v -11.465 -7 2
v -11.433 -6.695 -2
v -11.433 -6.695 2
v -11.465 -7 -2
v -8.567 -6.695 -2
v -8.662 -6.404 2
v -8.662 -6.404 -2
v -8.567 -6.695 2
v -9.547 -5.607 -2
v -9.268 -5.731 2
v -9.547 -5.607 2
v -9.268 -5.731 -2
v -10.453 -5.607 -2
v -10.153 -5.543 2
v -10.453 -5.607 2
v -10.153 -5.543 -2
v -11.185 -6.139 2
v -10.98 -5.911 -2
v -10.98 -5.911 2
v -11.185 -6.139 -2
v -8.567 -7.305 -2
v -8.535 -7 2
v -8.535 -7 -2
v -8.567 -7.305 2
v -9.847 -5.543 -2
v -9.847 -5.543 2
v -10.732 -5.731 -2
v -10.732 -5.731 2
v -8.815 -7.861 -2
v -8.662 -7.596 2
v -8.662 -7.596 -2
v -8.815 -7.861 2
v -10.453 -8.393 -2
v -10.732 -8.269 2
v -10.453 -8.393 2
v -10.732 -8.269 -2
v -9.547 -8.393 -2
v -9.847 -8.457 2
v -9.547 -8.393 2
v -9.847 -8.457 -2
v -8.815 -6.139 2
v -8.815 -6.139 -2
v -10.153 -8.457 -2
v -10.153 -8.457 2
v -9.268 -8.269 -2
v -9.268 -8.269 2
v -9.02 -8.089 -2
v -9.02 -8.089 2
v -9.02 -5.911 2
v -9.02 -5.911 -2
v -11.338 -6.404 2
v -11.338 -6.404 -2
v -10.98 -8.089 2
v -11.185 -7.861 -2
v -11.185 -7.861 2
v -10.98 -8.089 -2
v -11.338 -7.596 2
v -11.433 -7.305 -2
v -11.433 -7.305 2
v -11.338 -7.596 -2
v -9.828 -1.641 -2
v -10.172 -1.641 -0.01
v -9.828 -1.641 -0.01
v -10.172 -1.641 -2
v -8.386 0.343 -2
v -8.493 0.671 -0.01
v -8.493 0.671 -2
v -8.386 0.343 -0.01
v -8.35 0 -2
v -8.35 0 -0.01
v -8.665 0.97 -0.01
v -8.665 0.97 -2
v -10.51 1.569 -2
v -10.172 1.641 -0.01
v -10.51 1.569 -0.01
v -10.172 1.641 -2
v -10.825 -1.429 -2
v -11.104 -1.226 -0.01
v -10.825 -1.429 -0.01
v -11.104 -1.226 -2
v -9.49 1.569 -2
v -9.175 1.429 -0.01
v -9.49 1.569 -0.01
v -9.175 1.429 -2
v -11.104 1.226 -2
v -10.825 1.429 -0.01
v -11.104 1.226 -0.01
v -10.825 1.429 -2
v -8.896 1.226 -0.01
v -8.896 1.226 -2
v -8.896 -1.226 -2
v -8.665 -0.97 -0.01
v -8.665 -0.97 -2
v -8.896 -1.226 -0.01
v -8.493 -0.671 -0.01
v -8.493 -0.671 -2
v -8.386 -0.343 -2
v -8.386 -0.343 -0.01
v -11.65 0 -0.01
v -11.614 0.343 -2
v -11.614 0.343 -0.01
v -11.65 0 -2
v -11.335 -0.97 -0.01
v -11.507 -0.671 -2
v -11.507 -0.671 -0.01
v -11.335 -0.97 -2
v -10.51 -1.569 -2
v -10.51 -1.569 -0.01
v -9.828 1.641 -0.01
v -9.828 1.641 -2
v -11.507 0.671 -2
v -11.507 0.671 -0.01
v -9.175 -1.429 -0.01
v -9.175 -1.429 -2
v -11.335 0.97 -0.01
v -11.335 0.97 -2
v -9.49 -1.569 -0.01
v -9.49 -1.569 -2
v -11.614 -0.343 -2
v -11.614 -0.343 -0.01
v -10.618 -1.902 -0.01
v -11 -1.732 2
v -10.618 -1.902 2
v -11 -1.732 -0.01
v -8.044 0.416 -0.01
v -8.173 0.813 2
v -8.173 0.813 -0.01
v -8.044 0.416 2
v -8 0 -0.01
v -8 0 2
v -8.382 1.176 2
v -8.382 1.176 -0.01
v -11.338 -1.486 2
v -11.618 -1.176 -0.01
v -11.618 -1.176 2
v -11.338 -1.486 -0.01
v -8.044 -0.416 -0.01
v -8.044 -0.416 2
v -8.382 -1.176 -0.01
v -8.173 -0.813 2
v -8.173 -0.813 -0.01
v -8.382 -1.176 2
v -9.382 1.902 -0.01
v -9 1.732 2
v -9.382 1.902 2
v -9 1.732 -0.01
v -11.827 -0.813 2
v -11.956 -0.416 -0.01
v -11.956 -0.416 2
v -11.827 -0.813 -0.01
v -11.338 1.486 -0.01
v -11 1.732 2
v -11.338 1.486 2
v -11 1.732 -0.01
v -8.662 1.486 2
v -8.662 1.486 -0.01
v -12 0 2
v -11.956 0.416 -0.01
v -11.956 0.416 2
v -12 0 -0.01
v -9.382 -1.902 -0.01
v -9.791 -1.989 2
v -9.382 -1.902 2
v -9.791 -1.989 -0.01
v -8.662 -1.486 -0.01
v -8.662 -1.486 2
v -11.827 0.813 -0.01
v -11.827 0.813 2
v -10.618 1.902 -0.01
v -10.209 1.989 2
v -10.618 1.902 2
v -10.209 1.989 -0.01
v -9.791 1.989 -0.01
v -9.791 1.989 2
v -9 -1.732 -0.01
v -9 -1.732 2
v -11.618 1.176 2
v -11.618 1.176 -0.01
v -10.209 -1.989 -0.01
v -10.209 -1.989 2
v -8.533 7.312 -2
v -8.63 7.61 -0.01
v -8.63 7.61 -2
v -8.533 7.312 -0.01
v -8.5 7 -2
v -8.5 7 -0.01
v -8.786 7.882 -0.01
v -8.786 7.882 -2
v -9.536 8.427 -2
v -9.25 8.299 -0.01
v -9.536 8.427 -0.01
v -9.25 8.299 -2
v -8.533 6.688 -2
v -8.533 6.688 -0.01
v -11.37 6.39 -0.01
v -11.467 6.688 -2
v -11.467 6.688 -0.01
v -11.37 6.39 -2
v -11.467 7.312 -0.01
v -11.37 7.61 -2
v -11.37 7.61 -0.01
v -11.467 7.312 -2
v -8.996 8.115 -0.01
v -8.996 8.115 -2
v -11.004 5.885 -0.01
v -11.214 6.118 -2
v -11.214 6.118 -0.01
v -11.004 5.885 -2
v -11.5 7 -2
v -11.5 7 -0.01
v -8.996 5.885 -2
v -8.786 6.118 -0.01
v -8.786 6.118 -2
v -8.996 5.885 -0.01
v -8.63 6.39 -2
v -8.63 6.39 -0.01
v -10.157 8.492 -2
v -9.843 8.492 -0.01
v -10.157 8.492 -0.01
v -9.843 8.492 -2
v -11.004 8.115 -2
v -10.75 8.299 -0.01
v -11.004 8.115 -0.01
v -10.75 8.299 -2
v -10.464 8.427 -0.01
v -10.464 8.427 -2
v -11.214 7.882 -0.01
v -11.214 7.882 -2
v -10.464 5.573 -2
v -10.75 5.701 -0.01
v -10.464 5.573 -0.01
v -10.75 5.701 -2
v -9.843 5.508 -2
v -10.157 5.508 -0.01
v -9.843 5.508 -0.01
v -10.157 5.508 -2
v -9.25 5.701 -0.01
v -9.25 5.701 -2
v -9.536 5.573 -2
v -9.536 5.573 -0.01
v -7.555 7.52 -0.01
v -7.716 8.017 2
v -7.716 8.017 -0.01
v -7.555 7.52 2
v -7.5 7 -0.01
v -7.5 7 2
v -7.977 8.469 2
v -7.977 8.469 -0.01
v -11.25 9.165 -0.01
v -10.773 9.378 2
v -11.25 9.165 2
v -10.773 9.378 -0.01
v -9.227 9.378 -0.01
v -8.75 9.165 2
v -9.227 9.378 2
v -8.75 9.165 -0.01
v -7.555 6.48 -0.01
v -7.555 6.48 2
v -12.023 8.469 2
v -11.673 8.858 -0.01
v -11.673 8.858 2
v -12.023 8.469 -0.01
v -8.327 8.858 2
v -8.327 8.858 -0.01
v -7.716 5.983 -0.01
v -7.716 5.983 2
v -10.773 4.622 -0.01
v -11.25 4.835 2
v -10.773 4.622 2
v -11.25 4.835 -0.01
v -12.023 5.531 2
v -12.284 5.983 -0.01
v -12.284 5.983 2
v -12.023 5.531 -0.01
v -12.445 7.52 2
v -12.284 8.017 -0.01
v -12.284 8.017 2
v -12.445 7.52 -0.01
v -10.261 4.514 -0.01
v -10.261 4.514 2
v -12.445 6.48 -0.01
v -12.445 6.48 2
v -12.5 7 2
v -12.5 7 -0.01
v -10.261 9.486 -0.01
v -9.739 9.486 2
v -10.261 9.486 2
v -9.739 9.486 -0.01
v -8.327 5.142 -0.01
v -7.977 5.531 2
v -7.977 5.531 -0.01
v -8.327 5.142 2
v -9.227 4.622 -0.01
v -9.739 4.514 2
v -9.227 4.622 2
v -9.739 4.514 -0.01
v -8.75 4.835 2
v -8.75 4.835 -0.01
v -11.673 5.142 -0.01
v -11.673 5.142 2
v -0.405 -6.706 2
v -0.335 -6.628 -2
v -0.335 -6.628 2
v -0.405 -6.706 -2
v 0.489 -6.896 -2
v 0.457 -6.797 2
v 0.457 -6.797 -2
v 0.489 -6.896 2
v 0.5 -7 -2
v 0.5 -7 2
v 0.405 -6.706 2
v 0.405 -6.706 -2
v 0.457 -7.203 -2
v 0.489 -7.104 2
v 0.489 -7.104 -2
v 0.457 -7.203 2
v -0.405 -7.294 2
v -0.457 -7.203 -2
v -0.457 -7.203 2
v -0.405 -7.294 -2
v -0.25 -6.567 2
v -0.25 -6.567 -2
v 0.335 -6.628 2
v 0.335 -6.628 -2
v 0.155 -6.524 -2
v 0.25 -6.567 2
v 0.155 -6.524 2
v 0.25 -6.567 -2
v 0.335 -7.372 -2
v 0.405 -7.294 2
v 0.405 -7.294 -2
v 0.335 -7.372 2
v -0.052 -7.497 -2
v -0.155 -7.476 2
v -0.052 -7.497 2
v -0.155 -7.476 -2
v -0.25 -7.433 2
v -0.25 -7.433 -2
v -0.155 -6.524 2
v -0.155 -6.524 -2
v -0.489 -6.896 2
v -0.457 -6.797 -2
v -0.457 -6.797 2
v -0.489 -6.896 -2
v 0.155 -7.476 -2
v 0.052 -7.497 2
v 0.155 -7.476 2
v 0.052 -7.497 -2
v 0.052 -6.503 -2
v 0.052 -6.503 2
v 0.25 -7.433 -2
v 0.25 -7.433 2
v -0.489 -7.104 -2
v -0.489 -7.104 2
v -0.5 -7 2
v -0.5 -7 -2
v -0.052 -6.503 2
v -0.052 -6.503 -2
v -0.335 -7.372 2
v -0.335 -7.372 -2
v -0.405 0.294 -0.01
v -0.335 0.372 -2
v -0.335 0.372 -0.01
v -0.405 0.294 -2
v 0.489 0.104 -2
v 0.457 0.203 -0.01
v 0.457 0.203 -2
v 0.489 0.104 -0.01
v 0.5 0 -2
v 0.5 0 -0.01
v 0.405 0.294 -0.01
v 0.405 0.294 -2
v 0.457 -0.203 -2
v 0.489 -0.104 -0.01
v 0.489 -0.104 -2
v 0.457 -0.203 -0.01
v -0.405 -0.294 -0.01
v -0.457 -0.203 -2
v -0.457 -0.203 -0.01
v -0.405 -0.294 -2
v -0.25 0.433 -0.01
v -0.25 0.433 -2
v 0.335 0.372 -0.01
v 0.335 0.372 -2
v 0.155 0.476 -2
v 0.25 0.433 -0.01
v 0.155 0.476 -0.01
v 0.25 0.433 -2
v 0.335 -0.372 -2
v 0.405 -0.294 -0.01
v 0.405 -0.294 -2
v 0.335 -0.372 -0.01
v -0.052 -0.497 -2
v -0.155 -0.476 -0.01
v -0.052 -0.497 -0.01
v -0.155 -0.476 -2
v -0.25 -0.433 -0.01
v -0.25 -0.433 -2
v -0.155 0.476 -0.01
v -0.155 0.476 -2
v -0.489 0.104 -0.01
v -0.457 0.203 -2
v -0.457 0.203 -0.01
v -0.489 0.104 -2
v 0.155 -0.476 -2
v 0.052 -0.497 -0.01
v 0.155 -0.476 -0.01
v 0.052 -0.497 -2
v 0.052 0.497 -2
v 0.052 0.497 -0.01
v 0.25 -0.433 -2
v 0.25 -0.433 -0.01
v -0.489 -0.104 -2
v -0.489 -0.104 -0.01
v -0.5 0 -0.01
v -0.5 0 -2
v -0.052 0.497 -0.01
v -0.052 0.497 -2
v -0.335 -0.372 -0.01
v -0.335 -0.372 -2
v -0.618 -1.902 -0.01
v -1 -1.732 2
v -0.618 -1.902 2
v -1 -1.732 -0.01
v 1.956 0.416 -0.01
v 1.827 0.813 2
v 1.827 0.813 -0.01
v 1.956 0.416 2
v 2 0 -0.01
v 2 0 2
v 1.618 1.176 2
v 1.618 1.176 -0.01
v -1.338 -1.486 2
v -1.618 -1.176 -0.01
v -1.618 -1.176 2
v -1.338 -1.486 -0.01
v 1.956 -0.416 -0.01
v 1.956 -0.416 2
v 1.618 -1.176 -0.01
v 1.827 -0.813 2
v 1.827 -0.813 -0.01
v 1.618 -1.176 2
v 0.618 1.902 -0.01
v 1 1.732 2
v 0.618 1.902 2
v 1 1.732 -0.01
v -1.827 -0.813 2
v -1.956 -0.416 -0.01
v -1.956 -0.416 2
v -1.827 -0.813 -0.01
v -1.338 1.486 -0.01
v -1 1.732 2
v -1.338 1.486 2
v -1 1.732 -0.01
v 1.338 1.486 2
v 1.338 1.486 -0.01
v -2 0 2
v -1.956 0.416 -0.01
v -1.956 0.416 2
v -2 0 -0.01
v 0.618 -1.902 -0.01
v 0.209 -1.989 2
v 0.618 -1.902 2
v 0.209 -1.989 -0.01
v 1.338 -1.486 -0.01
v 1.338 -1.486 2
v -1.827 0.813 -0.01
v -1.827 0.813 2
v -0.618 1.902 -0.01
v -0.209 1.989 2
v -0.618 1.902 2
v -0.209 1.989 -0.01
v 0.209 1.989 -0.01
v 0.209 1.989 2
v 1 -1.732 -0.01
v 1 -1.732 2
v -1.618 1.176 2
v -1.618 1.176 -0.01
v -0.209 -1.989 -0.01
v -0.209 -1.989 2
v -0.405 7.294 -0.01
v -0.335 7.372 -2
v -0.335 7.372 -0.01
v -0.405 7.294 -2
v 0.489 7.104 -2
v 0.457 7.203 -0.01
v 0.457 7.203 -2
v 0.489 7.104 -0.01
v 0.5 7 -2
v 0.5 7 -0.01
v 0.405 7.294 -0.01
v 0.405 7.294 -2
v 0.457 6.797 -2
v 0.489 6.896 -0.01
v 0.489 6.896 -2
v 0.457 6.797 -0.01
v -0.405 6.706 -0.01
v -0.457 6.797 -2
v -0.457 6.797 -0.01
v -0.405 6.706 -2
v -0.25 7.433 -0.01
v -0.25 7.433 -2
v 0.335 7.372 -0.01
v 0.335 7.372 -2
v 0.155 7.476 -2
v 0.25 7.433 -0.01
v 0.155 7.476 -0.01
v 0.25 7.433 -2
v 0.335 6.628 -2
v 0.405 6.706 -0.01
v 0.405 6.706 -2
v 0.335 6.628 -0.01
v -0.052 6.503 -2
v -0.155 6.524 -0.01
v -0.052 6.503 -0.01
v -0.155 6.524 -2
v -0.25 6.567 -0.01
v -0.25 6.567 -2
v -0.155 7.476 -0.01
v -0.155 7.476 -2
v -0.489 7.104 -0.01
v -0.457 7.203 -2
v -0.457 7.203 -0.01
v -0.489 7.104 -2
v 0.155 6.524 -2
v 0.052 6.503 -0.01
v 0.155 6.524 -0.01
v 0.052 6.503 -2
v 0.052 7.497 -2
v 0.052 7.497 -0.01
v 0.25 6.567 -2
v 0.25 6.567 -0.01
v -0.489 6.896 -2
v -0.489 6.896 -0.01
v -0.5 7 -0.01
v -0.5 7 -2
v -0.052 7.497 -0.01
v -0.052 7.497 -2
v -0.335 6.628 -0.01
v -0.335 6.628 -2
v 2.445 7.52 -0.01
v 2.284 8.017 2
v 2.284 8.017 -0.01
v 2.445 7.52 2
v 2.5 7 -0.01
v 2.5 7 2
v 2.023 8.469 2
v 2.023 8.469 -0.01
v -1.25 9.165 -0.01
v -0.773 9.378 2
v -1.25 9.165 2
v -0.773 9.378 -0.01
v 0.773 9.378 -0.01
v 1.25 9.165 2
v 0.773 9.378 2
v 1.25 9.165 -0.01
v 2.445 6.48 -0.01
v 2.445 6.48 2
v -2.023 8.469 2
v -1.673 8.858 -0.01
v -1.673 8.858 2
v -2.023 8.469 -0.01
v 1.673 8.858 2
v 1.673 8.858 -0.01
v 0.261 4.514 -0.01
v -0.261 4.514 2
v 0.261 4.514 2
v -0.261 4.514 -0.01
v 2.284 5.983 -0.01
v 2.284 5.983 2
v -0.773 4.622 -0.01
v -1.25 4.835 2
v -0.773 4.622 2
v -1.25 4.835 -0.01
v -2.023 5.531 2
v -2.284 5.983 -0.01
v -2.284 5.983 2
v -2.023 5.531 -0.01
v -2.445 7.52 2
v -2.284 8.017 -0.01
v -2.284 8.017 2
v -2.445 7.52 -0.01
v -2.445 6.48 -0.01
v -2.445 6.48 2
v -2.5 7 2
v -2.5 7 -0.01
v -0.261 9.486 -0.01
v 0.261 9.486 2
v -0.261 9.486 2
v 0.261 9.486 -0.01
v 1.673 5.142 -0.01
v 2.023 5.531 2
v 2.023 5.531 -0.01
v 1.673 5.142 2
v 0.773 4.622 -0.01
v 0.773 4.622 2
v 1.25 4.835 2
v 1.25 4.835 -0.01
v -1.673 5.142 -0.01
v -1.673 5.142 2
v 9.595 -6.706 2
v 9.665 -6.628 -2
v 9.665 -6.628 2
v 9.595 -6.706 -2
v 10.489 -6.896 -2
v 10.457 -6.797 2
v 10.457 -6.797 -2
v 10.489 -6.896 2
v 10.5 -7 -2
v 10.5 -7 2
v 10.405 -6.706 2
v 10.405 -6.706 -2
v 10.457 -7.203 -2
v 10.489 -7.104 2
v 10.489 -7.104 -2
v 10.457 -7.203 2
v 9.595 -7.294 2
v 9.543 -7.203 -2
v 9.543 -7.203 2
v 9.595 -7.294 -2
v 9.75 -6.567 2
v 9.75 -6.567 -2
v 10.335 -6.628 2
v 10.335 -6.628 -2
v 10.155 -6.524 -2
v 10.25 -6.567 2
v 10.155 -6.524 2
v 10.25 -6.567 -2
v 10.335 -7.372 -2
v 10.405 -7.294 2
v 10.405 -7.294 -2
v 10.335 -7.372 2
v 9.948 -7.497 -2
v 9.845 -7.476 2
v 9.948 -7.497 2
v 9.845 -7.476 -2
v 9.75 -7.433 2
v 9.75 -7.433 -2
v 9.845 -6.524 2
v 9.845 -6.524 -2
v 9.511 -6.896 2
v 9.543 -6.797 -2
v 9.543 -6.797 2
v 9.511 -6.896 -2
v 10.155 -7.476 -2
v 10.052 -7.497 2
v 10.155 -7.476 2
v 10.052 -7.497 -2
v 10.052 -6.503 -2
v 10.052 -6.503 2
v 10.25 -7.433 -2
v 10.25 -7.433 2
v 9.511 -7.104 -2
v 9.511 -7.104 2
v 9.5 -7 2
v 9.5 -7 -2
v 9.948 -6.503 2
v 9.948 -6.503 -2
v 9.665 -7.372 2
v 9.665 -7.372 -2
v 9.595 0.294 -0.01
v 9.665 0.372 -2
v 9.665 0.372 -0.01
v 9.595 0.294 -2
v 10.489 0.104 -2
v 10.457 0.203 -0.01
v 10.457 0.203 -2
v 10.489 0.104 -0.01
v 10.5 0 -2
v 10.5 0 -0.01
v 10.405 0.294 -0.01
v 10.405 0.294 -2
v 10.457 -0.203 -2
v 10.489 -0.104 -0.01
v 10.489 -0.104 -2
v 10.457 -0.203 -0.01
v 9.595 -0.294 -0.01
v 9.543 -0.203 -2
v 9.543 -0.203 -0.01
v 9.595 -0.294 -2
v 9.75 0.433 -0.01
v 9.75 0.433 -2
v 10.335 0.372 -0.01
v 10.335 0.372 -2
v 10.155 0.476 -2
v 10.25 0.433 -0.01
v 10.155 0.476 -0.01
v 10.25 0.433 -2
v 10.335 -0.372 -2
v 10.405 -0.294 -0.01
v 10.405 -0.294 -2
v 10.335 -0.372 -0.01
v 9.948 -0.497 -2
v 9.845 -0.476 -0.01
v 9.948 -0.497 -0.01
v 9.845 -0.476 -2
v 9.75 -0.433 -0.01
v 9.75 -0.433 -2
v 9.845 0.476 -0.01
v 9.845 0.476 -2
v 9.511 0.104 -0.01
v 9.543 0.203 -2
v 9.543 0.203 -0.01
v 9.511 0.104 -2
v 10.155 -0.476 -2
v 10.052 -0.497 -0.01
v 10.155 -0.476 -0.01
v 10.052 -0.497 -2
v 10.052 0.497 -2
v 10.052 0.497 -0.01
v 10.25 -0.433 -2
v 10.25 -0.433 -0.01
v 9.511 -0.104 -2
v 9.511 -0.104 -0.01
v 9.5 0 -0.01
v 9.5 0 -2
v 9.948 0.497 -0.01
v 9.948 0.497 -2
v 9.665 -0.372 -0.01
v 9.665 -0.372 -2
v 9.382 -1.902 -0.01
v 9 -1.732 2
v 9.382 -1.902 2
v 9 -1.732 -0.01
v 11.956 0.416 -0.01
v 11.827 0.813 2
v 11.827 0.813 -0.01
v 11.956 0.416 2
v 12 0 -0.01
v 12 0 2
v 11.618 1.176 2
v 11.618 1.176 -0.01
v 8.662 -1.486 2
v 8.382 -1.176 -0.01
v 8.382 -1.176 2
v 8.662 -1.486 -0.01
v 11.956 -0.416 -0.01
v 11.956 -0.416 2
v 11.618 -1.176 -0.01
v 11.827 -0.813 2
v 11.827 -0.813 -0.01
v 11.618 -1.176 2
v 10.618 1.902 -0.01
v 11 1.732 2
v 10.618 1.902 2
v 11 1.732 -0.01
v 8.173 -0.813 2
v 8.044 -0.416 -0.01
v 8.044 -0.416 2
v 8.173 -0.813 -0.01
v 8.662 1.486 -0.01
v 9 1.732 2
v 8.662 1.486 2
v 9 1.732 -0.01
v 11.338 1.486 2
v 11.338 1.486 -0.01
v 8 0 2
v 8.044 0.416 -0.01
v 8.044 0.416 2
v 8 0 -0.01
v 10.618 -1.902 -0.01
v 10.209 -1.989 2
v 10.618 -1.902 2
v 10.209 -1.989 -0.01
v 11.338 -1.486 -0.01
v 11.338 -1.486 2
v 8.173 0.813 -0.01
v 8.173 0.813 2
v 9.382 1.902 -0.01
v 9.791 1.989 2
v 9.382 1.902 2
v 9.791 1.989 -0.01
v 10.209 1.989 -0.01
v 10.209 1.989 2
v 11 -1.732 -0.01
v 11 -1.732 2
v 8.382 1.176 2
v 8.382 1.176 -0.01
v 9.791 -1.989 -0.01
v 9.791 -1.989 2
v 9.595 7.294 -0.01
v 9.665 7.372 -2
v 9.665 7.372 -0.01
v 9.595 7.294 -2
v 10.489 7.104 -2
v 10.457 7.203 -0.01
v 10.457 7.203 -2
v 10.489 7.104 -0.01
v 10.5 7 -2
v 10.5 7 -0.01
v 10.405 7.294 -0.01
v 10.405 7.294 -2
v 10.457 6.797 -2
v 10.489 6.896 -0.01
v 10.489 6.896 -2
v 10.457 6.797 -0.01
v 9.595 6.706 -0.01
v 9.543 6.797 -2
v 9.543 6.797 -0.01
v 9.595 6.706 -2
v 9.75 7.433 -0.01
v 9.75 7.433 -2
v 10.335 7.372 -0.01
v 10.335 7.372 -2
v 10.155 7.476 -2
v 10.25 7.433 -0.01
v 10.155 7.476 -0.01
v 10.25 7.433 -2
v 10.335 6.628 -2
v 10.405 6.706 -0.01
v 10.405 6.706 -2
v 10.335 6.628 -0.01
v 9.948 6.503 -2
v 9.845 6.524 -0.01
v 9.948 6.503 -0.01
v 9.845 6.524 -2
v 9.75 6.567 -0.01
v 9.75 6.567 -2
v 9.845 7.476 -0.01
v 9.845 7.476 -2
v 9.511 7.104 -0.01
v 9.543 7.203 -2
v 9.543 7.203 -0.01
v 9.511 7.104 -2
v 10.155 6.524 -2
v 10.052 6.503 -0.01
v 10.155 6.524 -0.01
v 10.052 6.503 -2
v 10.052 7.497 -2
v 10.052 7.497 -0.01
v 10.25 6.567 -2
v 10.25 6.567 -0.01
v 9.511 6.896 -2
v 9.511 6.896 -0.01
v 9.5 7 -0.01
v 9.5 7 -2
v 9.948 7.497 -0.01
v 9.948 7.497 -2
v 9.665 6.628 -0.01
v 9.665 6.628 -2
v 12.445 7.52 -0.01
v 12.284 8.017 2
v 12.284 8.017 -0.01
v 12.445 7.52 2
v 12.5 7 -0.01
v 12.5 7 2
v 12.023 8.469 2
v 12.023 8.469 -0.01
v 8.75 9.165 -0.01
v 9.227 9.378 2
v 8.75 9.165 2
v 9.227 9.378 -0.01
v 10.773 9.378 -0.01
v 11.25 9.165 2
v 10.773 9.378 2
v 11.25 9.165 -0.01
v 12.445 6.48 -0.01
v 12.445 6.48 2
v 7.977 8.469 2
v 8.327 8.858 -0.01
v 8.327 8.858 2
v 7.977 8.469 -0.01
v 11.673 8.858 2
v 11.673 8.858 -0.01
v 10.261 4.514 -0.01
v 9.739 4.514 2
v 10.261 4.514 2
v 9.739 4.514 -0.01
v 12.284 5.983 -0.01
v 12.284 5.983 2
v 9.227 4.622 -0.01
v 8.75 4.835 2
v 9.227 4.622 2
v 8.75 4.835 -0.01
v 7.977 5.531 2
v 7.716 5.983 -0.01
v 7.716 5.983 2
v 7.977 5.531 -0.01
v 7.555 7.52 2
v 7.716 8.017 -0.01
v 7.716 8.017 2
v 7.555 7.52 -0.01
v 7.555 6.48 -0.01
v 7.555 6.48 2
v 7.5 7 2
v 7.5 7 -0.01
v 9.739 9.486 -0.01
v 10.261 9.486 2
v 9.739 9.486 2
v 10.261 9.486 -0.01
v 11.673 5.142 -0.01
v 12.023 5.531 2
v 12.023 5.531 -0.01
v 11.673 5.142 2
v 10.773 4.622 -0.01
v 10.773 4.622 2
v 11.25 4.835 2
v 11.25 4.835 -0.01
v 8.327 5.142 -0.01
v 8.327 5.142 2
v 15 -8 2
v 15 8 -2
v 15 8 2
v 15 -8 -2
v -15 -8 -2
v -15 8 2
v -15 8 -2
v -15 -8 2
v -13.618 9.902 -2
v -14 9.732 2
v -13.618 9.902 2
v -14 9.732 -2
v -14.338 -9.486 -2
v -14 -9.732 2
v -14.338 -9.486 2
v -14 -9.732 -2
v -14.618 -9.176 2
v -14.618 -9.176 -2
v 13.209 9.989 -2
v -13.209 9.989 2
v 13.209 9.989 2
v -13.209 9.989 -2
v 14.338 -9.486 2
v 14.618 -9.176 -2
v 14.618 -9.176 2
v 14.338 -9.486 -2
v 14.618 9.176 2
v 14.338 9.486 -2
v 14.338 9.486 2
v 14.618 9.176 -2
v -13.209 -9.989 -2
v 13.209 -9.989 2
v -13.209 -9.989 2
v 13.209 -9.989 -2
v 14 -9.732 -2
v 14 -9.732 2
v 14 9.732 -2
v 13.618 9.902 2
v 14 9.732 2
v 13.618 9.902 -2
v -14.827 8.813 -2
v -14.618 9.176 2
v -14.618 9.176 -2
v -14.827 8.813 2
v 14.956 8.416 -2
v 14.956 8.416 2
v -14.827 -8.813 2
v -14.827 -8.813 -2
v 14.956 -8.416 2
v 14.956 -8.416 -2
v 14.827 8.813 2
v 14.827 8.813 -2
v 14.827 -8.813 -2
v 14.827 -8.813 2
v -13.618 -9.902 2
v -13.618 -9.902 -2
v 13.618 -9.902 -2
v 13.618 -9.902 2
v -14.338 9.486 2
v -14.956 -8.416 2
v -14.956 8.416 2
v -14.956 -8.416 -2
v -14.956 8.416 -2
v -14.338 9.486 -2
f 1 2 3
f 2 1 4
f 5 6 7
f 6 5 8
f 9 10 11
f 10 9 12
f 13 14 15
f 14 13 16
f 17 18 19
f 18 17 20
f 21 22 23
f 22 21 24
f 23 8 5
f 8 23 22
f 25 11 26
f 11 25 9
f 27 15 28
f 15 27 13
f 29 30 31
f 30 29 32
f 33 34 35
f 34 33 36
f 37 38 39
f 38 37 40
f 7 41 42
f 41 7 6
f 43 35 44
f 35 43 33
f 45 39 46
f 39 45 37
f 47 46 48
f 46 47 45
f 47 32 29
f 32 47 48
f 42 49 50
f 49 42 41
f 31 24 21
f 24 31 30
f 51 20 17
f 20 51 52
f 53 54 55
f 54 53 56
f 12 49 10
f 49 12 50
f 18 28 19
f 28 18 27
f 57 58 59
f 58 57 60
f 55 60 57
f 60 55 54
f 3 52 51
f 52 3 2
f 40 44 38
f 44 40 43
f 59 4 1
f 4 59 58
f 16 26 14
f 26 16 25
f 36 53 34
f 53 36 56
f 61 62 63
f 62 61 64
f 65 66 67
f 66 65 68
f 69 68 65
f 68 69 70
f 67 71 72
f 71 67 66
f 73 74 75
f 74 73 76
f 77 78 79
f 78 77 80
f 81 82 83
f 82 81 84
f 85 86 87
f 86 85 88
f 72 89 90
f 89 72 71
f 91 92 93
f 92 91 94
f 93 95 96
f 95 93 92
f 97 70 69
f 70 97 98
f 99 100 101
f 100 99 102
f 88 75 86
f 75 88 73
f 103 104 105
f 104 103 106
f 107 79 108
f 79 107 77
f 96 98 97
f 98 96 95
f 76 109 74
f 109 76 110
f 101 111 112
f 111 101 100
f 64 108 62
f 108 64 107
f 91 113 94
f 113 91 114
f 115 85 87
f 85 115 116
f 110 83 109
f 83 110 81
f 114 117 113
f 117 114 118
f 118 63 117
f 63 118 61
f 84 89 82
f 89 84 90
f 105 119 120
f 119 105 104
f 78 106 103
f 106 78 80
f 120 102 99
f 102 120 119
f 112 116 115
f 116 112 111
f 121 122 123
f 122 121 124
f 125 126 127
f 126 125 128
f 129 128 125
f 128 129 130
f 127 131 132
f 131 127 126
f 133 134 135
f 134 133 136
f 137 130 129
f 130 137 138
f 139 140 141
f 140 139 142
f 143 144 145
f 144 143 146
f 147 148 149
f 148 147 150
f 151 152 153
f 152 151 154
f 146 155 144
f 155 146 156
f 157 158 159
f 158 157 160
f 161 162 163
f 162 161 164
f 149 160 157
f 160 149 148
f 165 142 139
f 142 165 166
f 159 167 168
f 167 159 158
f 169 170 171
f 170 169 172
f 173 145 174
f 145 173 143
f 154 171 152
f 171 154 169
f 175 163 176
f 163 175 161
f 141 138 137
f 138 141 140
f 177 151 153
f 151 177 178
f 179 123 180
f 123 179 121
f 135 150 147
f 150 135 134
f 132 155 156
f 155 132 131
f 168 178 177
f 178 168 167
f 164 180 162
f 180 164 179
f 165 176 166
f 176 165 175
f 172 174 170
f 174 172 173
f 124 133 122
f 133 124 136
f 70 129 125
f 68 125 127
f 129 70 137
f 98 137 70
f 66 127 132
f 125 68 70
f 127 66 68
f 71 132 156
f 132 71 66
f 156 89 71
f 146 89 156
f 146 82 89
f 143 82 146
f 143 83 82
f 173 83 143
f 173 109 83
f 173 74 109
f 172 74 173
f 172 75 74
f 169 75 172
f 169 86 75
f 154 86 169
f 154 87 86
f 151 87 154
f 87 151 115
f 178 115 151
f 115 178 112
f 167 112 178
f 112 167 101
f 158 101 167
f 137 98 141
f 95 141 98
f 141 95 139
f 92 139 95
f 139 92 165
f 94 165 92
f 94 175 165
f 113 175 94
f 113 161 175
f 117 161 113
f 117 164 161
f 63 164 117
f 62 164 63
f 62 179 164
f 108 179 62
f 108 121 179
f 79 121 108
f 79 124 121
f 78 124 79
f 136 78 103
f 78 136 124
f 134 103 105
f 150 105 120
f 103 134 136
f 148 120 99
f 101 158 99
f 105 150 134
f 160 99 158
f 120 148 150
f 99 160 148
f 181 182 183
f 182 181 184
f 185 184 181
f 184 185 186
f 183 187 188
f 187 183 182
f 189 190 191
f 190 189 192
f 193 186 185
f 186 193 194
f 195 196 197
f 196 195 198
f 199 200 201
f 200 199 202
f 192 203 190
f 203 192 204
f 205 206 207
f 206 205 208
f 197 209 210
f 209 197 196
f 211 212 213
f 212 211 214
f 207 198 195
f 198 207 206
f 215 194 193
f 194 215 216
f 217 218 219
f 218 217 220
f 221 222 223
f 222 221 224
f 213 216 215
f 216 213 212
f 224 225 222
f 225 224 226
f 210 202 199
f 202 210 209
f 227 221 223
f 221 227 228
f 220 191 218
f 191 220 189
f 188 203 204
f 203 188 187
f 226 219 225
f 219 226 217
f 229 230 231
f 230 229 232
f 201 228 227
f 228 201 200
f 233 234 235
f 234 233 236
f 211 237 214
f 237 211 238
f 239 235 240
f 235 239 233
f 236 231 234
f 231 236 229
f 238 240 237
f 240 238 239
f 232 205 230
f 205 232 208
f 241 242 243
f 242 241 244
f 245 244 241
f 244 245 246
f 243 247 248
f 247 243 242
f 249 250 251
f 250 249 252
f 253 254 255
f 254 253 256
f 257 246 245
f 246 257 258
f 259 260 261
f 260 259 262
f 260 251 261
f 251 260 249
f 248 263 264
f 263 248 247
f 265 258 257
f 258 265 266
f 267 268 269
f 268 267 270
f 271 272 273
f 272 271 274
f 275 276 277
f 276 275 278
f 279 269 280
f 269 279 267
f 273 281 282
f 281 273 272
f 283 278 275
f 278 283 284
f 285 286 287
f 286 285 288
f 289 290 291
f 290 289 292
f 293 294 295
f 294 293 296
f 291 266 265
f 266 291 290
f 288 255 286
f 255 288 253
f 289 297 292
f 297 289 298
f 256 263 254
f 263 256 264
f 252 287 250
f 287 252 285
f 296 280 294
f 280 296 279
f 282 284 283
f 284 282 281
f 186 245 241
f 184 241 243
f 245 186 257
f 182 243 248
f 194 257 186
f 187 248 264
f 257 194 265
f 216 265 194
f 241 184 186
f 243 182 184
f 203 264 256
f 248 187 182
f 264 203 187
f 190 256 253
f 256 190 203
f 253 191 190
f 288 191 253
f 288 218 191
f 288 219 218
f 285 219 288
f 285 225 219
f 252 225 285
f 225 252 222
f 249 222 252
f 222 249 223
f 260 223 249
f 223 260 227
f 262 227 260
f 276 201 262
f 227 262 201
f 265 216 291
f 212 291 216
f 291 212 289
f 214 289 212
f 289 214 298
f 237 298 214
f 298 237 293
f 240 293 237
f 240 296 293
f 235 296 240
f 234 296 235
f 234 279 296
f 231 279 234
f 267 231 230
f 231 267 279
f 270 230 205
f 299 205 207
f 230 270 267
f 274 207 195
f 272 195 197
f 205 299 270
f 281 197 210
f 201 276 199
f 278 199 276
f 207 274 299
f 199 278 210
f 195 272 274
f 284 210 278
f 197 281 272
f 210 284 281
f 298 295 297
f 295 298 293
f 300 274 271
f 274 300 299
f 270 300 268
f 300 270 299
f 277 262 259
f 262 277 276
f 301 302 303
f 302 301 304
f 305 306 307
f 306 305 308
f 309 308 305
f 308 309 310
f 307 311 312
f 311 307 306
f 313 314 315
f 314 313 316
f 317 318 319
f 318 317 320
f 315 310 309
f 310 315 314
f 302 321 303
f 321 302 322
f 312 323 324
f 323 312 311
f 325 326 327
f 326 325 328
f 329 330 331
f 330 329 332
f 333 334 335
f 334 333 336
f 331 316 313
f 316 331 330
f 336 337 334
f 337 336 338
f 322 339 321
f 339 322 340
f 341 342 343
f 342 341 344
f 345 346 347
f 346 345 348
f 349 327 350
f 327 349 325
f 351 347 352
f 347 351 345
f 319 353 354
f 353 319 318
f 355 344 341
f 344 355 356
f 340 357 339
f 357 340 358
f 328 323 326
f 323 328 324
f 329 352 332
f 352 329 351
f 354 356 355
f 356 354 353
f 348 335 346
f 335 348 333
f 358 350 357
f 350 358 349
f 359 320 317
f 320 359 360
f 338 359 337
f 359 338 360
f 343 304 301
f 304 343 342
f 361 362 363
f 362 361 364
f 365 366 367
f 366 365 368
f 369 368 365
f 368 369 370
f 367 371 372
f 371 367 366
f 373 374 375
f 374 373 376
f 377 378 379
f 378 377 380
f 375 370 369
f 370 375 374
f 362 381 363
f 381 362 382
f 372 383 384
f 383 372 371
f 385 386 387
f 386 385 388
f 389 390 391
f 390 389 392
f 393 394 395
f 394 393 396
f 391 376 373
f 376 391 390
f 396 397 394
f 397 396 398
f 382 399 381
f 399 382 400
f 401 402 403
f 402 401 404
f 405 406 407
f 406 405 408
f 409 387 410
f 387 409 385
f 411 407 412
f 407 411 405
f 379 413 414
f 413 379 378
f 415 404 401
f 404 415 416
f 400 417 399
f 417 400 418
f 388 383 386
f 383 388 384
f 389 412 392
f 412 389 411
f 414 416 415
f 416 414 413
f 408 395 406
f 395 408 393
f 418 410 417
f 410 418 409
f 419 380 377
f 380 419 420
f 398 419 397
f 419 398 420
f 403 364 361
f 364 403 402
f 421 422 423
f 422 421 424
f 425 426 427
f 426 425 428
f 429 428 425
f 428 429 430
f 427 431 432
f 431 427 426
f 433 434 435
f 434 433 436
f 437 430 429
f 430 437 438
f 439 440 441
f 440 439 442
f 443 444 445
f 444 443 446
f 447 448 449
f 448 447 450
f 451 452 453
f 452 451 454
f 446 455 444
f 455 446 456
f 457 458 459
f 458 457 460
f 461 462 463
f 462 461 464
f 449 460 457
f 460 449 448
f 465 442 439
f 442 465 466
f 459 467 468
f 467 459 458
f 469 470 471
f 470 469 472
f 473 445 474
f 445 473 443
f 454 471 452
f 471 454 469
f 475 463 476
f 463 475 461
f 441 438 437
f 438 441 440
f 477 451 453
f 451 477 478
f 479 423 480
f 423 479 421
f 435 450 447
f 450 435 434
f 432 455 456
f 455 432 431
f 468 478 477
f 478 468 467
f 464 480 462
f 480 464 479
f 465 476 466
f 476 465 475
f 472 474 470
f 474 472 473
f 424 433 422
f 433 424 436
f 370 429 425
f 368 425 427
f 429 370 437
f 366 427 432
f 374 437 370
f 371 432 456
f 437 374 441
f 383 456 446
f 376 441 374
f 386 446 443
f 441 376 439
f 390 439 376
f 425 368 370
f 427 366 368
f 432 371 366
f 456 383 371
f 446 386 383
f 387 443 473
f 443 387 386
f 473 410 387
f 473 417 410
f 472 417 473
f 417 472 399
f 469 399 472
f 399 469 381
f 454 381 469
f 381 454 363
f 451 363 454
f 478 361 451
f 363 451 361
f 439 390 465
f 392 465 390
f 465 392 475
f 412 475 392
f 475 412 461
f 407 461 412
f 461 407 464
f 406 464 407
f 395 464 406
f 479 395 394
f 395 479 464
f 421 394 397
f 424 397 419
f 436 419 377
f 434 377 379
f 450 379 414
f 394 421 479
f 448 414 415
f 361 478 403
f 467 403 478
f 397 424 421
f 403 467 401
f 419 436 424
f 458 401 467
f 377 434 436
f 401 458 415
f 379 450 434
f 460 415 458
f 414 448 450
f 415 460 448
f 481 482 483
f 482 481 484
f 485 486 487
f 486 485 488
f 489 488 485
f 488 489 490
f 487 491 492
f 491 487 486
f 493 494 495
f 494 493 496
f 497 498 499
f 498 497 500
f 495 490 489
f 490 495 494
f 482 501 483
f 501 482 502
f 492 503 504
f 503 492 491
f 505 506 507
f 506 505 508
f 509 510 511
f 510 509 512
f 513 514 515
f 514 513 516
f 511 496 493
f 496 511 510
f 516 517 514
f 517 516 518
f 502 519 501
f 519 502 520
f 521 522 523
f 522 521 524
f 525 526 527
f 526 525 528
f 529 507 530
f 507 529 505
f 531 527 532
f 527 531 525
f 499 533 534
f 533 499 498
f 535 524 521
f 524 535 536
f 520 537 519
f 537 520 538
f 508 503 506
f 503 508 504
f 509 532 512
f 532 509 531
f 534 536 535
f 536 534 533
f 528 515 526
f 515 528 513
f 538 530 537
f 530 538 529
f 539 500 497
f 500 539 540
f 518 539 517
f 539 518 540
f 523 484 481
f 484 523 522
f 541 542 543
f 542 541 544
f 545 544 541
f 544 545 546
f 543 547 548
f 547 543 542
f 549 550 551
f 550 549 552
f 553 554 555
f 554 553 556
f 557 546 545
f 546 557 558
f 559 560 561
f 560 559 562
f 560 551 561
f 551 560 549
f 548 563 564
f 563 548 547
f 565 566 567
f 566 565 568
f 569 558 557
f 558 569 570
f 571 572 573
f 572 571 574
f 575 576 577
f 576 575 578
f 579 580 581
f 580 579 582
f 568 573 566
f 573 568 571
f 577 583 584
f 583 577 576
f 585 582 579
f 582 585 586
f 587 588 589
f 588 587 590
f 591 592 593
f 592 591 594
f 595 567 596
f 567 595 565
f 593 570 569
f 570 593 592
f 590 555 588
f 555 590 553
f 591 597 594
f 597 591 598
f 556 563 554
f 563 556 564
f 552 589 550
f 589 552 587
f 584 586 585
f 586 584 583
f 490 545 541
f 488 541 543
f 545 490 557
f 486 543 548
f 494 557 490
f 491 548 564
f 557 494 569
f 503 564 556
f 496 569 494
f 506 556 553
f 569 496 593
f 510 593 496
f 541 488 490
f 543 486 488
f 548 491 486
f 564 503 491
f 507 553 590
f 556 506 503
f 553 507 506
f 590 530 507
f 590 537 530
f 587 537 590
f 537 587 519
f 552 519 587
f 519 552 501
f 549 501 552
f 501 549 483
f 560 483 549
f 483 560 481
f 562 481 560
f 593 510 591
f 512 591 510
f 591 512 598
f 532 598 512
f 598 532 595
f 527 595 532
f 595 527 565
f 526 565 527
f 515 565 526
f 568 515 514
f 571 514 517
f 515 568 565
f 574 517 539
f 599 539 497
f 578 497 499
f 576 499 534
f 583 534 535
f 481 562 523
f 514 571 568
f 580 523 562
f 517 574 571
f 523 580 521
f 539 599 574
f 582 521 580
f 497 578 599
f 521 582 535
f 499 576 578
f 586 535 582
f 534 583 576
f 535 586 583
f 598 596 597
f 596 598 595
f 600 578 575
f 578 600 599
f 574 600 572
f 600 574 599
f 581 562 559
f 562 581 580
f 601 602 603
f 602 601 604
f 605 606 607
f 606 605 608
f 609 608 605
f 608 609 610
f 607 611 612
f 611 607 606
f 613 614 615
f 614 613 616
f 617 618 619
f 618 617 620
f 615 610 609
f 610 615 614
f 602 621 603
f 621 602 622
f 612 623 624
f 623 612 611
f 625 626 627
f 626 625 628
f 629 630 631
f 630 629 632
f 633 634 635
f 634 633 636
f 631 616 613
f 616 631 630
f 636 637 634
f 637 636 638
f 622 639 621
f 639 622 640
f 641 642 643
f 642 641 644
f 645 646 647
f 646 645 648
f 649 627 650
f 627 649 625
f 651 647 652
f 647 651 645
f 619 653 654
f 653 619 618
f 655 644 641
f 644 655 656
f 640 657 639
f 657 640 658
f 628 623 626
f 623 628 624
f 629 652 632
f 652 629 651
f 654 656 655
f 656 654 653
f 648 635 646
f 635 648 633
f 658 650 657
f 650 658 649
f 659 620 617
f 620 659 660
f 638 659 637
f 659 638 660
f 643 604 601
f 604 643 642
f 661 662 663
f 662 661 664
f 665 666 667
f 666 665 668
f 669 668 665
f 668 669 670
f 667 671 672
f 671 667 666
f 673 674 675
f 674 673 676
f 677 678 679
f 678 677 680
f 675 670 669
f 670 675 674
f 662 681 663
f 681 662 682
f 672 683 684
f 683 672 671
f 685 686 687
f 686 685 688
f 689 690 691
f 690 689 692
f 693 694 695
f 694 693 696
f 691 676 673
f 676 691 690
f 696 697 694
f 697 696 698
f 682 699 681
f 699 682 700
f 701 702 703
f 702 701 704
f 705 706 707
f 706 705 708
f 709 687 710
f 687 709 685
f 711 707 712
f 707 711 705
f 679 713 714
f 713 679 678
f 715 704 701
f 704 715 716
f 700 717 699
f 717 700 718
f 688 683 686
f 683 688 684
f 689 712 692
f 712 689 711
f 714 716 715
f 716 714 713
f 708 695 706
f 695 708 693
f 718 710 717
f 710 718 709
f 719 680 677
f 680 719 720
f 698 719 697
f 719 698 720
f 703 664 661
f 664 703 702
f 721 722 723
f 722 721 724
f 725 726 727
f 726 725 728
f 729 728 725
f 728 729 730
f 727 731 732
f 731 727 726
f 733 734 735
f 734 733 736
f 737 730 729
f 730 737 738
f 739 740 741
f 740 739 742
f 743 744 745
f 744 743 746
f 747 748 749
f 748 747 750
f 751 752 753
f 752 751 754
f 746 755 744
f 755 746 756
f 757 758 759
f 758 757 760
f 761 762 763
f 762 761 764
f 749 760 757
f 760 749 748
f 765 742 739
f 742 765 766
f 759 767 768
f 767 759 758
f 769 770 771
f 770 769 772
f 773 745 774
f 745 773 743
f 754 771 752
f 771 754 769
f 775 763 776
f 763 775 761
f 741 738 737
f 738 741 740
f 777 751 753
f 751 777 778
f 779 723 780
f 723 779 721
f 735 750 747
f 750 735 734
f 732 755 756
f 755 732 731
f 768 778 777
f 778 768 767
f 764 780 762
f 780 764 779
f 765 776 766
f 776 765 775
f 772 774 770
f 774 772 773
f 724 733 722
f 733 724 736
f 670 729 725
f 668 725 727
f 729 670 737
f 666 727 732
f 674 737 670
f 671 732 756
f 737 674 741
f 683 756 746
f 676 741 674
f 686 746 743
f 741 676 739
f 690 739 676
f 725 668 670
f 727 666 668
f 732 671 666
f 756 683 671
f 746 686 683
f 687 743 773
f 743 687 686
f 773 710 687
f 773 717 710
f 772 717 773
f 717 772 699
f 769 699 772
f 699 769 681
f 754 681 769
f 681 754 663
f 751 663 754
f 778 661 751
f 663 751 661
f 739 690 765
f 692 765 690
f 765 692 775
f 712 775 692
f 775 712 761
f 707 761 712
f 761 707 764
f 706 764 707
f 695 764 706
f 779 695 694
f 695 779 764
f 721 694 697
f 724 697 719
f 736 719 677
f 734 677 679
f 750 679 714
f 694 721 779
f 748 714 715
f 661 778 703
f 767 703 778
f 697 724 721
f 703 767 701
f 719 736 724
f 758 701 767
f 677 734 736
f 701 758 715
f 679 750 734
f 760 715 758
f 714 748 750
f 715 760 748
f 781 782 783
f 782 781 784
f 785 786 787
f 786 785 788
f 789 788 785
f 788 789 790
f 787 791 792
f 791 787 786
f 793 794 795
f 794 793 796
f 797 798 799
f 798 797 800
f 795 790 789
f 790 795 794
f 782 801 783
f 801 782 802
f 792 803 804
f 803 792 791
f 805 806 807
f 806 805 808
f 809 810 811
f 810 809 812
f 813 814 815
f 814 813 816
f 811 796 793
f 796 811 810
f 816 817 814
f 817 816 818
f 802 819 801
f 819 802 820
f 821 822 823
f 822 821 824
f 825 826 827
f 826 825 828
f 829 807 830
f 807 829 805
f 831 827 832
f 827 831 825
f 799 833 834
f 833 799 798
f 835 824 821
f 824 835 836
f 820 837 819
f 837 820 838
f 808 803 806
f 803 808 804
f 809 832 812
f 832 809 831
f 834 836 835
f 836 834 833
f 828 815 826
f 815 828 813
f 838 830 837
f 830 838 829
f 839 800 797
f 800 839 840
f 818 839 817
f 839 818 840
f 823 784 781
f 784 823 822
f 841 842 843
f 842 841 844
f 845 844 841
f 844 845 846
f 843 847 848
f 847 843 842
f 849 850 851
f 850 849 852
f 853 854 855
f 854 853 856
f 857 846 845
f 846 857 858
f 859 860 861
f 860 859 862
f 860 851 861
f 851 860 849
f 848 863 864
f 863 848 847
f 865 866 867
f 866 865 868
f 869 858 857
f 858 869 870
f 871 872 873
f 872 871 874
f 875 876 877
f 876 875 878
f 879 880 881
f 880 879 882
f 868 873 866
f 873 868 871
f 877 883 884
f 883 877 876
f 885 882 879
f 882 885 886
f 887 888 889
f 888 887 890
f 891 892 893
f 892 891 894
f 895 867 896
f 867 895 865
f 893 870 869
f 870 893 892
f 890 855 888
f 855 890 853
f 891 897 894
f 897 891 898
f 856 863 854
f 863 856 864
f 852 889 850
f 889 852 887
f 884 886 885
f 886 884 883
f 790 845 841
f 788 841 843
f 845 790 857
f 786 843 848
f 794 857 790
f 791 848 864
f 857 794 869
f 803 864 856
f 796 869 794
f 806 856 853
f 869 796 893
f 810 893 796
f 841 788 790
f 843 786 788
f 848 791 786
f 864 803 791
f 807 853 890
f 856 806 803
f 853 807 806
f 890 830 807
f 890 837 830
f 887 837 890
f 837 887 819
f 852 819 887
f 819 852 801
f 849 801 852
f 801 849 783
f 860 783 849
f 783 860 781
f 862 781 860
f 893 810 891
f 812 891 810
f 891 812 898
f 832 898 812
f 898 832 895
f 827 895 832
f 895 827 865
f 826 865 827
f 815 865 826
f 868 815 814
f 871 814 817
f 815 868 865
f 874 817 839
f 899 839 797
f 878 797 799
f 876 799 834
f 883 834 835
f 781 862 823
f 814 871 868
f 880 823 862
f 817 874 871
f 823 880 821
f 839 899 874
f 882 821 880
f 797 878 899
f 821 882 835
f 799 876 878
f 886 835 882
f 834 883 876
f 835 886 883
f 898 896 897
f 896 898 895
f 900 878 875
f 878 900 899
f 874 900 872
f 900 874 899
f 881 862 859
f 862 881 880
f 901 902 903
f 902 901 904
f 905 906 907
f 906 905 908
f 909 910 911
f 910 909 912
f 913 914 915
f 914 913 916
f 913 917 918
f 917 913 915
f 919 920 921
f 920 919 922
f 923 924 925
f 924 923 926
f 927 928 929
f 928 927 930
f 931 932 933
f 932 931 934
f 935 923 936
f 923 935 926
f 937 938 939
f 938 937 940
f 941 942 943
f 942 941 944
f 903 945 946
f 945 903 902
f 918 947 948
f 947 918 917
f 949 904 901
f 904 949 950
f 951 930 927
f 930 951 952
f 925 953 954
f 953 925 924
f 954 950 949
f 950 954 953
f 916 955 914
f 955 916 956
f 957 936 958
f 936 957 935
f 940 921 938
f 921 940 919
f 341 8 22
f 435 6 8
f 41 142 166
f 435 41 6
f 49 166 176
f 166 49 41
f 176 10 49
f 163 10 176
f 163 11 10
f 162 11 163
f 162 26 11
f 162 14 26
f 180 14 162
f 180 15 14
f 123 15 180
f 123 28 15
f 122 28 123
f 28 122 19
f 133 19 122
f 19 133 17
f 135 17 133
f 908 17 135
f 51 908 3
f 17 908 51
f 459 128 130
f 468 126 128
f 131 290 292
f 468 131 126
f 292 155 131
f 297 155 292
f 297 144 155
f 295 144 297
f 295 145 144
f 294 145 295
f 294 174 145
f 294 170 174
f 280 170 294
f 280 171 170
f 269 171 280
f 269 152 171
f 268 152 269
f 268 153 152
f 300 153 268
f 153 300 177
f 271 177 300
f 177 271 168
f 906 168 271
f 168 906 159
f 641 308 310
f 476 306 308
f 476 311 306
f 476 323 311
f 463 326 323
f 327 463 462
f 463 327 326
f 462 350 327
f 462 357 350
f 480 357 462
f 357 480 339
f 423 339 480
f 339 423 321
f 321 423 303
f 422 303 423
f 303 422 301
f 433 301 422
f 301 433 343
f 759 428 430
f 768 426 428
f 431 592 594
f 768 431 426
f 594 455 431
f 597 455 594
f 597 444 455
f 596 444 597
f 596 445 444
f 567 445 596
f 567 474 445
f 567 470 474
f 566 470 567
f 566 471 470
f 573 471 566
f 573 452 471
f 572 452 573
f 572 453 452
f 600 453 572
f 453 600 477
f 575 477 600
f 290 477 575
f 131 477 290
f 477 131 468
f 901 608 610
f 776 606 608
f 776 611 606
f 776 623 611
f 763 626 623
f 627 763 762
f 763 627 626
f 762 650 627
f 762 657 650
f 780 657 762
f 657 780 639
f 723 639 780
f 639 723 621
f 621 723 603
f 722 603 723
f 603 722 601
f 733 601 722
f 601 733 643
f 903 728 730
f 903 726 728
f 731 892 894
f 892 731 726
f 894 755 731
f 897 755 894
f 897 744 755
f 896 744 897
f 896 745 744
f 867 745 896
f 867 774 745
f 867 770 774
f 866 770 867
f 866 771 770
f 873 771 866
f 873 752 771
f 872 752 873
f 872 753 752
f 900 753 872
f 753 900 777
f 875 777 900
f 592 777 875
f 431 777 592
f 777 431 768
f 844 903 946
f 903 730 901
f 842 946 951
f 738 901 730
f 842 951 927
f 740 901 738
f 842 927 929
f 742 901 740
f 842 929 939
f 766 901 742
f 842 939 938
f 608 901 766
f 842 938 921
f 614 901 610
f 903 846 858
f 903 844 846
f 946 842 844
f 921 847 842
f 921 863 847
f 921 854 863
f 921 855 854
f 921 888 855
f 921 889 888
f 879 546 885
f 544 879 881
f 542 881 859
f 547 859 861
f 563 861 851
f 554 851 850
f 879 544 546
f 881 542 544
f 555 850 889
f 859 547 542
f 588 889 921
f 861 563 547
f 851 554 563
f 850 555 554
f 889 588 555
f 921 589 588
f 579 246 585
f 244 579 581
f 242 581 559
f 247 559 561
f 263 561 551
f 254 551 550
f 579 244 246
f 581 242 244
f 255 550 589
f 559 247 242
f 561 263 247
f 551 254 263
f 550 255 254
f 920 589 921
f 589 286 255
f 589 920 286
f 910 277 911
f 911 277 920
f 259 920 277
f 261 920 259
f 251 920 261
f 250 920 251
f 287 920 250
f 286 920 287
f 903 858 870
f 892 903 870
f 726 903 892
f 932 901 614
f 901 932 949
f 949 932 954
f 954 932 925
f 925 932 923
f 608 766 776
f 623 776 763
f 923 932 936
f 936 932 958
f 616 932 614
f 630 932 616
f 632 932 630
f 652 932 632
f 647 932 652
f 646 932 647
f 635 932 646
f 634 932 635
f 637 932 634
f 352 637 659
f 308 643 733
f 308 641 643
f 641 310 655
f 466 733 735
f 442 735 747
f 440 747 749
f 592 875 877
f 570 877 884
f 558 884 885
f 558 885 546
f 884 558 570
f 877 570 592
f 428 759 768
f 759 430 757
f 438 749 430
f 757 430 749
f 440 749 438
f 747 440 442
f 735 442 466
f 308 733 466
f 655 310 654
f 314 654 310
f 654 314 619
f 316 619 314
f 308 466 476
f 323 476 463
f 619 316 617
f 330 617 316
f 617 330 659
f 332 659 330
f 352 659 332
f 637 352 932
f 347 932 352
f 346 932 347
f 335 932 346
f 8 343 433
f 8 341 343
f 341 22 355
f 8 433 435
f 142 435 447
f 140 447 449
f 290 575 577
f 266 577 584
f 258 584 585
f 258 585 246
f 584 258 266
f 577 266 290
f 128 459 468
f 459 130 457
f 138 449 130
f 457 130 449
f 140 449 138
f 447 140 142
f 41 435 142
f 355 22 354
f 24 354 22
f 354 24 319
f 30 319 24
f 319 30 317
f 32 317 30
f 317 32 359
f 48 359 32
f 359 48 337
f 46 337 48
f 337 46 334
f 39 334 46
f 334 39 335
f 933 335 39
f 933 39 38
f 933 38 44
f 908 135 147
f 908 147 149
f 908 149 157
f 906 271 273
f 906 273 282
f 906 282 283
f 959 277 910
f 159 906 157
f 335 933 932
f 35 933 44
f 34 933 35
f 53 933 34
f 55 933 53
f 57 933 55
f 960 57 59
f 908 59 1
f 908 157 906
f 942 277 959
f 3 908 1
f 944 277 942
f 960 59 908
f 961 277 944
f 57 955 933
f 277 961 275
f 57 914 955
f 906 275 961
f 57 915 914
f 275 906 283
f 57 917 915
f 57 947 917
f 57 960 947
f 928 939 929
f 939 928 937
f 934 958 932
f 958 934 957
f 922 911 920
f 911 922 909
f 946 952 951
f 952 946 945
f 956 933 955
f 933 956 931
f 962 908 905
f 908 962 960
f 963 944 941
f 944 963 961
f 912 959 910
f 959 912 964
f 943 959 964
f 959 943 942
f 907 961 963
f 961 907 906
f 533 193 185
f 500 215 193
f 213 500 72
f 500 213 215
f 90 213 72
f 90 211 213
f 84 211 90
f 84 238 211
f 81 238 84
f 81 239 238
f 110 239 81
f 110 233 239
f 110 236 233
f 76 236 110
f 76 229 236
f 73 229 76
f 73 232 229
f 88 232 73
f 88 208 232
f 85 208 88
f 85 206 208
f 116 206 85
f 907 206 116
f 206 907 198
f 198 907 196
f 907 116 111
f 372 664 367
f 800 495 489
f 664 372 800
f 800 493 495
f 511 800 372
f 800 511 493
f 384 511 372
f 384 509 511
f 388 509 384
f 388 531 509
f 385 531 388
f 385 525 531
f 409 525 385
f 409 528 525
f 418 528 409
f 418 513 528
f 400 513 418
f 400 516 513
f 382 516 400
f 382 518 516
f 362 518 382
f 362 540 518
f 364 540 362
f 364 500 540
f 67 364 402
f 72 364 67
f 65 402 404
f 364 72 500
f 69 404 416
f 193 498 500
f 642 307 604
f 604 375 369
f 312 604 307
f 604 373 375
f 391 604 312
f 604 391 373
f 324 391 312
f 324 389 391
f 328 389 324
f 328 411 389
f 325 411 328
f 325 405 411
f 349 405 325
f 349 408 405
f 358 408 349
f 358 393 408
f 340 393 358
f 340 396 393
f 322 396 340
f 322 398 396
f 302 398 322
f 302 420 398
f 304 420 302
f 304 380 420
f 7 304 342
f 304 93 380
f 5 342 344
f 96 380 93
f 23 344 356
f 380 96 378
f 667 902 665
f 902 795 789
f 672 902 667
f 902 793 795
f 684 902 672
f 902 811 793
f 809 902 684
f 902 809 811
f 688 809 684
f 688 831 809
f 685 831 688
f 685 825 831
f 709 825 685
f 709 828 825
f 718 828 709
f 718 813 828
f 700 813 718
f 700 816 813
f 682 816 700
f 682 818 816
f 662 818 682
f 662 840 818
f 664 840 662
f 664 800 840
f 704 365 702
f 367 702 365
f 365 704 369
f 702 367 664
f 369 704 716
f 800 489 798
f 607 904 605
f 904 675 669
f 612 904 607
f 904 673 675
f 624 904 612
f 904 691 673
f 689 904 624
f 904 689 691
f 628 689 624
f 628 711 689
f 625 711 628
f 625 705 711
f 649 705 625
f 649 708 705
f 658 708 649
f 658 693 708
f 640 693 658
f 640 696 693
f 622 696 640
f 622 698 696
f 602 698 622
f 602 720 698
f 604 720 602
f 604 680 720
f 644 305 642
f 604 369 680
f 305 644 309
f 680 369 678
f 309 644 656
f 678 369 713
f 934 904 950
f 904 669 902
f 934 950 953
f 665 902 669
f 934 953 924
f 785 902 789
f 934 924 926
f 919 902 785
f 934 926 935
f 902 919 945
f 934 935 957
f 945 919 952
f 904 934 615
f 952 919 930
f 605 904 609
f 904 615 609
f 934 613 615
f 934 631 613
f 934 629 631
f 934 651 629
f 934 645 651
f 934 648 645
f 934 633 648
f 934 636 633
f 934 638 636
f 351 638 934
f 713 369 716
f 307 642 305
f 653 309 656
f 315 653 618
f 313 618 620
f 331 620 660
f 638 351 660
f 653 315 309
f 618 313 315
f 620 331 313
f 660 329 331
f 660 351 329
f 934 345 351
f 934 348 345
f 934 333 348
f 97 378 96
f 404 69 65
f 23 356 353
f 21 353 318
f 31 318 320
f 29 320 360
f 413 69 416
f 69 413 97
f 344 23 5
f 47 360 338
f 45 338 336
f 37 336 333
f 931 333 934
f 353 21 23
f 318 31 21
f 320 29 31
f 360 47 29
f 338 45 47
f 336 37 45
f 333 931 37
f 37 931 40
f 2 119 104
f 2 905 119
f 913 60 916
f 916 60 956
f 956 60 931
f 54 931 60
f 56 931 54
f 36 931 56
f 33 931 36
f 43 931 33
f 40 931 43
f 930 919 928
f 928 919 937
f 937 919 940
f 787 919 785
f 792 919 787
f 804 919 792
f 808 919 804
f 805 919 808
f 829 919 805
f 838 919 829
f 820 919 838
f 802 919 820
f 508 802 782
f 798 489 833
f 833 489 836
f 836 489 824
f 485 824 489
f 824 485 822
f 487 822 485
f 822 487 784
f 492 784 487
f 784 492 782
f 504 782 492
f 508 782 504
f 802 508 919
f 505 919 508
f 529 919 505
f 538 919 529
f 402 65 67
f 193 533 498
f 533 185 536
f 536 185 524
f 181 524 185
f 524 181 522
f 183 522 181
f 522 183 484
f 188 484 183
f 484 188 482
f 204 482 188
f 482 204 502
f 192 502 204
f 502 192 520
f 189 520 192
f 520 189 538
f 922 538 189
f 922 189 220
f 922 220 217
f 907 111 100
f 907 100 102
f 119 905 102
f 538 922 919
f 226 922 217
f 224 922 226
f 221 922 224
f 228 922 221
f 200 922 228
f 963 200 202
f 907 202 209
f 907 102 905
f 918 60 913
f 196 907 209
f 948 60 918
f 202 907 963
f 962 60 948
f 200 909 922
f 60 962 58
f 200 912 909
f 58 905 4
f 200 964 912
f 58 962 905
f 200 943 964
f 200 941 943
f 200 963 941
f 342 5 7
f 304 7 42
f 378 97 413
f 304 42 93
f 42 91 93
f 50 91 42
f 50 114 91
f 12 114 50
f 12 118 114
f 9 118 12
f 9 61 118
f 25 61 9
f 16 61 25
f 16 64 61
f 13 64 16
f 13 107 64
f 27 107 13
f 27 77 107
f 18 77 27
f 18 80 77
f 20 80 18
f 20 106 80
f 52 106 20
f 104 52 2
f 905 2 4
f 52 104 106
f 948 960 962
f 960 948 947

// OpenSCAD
// file: boltHolesCutout_h.scad
//
//	These dimentions are all diamiters.
//
bhc_m3ShaftReal		= 2.93;	// This is the real dimention.
bhc_m3ShaftSlip 	= 3.3;	// Use this for threading
bhc_m3ShaftThread = 3.0;	// Use this for a hole to slip through.

bhc_m3CapButton 	= 5;
bhc_m3CapSocket 	= 4;

bhc_m4ShaftReal 	= 1;
bhc_m4ShaftSlip 	= 1;
bhc_m4ShaftThread = 1;

bhc_m4CapButton 	= 5;
bhc_m4CapSocket 	= 4;

bhc_m5ShaftReal 	= 1;
bhc_m5ShaftSlip 	= 1;
bhc_m5ShaftThread = 1;

bhc_m5CapButton 	= 5;
bhc_m5CapSocket 	= 4;
// main file
$fn=30;

include<boltHolesCutout_h.scad>;

bhc_example();
////////////////////////////////////////////////////////////////////////////////////////////////////
module bhc_example(){
	difference(){
		bhc_plate4Point(30,20,4,4);
		translate([-10,0,0])
			bhc_line(bhc_m3ShaftReal, 0, bhc_m3ShaftSlip, bhc_m3CapSocket, bhc_m3ShaftThread, bhc_m3CapButton);
		translate([0,0,0])
			bhc_line(bhc_m4ShaftReal, 0, bhc_m4ShaftSlip, bhc_m4CapSocket, bhc_m4ShaftThread, bhc_m4CapButton);
		translate([10,0,0])
			bhc_line(bhc_m5ShaftReal, 0, bhc_m5ShaftSlip, bhc_m5CapSocket, bhc_m5ShaftThread, bhc_m5CapButton);
	}
}
////////////////////////////////////////////////////////////////////////////////////////////////////
module bhc_line(iShaft0, iCap0=0, iShaft1, iCap1, iShaft2, iCap2){
	translate([0,-7,0])
		#bhc_bolt(iShaft0);
	translate([0,0,-5])
		#bhc_bolt(iShaft1, iCD=iCap1);
	translate([0,7,-5])
		#bhc_bolt(iShaft2, iCD=iCap2);	
}
////////////////////////////////////////////////////////////////////////////////////////////////////
module bhc_bolt(iSD, iSH=10, iCD=5, iCH=5){
// Bolt Shaft
  color("grey") cylinder(d=iSD, h=iSH,center=true);
// Bolt Top
	translate([0,0,(iSH/2)+(iCH/2)-.01])
		color("grey")
		cylinder(d=iCD,h=iCH,center=true);
}
////////////////////////////////////////////////////////////////////////////////////////////////////
module bhc_plate4Point(x,y,z,d){
	hull(){
		color("green") translate([(x/2)-(d/2) ,(y/2) -(d/2),0]) cylinder(h=z, d=d, center=true);
		color("blue")  translate([(x/2)-(d/2) ,-(y/2)+(d/2),0]) cylinder(h=z, d=d, center=true);
		color("red")   translate([-(x/2)+(d/2),(y/2) -(d/2),0]) cylinder(h=z, d=d, center=true);
		color("grey")  translate([-(x/2)+(d/2),-(y/2)+(d/2),0]) cylinder(h=z, d=d, center=true);
	}
}
